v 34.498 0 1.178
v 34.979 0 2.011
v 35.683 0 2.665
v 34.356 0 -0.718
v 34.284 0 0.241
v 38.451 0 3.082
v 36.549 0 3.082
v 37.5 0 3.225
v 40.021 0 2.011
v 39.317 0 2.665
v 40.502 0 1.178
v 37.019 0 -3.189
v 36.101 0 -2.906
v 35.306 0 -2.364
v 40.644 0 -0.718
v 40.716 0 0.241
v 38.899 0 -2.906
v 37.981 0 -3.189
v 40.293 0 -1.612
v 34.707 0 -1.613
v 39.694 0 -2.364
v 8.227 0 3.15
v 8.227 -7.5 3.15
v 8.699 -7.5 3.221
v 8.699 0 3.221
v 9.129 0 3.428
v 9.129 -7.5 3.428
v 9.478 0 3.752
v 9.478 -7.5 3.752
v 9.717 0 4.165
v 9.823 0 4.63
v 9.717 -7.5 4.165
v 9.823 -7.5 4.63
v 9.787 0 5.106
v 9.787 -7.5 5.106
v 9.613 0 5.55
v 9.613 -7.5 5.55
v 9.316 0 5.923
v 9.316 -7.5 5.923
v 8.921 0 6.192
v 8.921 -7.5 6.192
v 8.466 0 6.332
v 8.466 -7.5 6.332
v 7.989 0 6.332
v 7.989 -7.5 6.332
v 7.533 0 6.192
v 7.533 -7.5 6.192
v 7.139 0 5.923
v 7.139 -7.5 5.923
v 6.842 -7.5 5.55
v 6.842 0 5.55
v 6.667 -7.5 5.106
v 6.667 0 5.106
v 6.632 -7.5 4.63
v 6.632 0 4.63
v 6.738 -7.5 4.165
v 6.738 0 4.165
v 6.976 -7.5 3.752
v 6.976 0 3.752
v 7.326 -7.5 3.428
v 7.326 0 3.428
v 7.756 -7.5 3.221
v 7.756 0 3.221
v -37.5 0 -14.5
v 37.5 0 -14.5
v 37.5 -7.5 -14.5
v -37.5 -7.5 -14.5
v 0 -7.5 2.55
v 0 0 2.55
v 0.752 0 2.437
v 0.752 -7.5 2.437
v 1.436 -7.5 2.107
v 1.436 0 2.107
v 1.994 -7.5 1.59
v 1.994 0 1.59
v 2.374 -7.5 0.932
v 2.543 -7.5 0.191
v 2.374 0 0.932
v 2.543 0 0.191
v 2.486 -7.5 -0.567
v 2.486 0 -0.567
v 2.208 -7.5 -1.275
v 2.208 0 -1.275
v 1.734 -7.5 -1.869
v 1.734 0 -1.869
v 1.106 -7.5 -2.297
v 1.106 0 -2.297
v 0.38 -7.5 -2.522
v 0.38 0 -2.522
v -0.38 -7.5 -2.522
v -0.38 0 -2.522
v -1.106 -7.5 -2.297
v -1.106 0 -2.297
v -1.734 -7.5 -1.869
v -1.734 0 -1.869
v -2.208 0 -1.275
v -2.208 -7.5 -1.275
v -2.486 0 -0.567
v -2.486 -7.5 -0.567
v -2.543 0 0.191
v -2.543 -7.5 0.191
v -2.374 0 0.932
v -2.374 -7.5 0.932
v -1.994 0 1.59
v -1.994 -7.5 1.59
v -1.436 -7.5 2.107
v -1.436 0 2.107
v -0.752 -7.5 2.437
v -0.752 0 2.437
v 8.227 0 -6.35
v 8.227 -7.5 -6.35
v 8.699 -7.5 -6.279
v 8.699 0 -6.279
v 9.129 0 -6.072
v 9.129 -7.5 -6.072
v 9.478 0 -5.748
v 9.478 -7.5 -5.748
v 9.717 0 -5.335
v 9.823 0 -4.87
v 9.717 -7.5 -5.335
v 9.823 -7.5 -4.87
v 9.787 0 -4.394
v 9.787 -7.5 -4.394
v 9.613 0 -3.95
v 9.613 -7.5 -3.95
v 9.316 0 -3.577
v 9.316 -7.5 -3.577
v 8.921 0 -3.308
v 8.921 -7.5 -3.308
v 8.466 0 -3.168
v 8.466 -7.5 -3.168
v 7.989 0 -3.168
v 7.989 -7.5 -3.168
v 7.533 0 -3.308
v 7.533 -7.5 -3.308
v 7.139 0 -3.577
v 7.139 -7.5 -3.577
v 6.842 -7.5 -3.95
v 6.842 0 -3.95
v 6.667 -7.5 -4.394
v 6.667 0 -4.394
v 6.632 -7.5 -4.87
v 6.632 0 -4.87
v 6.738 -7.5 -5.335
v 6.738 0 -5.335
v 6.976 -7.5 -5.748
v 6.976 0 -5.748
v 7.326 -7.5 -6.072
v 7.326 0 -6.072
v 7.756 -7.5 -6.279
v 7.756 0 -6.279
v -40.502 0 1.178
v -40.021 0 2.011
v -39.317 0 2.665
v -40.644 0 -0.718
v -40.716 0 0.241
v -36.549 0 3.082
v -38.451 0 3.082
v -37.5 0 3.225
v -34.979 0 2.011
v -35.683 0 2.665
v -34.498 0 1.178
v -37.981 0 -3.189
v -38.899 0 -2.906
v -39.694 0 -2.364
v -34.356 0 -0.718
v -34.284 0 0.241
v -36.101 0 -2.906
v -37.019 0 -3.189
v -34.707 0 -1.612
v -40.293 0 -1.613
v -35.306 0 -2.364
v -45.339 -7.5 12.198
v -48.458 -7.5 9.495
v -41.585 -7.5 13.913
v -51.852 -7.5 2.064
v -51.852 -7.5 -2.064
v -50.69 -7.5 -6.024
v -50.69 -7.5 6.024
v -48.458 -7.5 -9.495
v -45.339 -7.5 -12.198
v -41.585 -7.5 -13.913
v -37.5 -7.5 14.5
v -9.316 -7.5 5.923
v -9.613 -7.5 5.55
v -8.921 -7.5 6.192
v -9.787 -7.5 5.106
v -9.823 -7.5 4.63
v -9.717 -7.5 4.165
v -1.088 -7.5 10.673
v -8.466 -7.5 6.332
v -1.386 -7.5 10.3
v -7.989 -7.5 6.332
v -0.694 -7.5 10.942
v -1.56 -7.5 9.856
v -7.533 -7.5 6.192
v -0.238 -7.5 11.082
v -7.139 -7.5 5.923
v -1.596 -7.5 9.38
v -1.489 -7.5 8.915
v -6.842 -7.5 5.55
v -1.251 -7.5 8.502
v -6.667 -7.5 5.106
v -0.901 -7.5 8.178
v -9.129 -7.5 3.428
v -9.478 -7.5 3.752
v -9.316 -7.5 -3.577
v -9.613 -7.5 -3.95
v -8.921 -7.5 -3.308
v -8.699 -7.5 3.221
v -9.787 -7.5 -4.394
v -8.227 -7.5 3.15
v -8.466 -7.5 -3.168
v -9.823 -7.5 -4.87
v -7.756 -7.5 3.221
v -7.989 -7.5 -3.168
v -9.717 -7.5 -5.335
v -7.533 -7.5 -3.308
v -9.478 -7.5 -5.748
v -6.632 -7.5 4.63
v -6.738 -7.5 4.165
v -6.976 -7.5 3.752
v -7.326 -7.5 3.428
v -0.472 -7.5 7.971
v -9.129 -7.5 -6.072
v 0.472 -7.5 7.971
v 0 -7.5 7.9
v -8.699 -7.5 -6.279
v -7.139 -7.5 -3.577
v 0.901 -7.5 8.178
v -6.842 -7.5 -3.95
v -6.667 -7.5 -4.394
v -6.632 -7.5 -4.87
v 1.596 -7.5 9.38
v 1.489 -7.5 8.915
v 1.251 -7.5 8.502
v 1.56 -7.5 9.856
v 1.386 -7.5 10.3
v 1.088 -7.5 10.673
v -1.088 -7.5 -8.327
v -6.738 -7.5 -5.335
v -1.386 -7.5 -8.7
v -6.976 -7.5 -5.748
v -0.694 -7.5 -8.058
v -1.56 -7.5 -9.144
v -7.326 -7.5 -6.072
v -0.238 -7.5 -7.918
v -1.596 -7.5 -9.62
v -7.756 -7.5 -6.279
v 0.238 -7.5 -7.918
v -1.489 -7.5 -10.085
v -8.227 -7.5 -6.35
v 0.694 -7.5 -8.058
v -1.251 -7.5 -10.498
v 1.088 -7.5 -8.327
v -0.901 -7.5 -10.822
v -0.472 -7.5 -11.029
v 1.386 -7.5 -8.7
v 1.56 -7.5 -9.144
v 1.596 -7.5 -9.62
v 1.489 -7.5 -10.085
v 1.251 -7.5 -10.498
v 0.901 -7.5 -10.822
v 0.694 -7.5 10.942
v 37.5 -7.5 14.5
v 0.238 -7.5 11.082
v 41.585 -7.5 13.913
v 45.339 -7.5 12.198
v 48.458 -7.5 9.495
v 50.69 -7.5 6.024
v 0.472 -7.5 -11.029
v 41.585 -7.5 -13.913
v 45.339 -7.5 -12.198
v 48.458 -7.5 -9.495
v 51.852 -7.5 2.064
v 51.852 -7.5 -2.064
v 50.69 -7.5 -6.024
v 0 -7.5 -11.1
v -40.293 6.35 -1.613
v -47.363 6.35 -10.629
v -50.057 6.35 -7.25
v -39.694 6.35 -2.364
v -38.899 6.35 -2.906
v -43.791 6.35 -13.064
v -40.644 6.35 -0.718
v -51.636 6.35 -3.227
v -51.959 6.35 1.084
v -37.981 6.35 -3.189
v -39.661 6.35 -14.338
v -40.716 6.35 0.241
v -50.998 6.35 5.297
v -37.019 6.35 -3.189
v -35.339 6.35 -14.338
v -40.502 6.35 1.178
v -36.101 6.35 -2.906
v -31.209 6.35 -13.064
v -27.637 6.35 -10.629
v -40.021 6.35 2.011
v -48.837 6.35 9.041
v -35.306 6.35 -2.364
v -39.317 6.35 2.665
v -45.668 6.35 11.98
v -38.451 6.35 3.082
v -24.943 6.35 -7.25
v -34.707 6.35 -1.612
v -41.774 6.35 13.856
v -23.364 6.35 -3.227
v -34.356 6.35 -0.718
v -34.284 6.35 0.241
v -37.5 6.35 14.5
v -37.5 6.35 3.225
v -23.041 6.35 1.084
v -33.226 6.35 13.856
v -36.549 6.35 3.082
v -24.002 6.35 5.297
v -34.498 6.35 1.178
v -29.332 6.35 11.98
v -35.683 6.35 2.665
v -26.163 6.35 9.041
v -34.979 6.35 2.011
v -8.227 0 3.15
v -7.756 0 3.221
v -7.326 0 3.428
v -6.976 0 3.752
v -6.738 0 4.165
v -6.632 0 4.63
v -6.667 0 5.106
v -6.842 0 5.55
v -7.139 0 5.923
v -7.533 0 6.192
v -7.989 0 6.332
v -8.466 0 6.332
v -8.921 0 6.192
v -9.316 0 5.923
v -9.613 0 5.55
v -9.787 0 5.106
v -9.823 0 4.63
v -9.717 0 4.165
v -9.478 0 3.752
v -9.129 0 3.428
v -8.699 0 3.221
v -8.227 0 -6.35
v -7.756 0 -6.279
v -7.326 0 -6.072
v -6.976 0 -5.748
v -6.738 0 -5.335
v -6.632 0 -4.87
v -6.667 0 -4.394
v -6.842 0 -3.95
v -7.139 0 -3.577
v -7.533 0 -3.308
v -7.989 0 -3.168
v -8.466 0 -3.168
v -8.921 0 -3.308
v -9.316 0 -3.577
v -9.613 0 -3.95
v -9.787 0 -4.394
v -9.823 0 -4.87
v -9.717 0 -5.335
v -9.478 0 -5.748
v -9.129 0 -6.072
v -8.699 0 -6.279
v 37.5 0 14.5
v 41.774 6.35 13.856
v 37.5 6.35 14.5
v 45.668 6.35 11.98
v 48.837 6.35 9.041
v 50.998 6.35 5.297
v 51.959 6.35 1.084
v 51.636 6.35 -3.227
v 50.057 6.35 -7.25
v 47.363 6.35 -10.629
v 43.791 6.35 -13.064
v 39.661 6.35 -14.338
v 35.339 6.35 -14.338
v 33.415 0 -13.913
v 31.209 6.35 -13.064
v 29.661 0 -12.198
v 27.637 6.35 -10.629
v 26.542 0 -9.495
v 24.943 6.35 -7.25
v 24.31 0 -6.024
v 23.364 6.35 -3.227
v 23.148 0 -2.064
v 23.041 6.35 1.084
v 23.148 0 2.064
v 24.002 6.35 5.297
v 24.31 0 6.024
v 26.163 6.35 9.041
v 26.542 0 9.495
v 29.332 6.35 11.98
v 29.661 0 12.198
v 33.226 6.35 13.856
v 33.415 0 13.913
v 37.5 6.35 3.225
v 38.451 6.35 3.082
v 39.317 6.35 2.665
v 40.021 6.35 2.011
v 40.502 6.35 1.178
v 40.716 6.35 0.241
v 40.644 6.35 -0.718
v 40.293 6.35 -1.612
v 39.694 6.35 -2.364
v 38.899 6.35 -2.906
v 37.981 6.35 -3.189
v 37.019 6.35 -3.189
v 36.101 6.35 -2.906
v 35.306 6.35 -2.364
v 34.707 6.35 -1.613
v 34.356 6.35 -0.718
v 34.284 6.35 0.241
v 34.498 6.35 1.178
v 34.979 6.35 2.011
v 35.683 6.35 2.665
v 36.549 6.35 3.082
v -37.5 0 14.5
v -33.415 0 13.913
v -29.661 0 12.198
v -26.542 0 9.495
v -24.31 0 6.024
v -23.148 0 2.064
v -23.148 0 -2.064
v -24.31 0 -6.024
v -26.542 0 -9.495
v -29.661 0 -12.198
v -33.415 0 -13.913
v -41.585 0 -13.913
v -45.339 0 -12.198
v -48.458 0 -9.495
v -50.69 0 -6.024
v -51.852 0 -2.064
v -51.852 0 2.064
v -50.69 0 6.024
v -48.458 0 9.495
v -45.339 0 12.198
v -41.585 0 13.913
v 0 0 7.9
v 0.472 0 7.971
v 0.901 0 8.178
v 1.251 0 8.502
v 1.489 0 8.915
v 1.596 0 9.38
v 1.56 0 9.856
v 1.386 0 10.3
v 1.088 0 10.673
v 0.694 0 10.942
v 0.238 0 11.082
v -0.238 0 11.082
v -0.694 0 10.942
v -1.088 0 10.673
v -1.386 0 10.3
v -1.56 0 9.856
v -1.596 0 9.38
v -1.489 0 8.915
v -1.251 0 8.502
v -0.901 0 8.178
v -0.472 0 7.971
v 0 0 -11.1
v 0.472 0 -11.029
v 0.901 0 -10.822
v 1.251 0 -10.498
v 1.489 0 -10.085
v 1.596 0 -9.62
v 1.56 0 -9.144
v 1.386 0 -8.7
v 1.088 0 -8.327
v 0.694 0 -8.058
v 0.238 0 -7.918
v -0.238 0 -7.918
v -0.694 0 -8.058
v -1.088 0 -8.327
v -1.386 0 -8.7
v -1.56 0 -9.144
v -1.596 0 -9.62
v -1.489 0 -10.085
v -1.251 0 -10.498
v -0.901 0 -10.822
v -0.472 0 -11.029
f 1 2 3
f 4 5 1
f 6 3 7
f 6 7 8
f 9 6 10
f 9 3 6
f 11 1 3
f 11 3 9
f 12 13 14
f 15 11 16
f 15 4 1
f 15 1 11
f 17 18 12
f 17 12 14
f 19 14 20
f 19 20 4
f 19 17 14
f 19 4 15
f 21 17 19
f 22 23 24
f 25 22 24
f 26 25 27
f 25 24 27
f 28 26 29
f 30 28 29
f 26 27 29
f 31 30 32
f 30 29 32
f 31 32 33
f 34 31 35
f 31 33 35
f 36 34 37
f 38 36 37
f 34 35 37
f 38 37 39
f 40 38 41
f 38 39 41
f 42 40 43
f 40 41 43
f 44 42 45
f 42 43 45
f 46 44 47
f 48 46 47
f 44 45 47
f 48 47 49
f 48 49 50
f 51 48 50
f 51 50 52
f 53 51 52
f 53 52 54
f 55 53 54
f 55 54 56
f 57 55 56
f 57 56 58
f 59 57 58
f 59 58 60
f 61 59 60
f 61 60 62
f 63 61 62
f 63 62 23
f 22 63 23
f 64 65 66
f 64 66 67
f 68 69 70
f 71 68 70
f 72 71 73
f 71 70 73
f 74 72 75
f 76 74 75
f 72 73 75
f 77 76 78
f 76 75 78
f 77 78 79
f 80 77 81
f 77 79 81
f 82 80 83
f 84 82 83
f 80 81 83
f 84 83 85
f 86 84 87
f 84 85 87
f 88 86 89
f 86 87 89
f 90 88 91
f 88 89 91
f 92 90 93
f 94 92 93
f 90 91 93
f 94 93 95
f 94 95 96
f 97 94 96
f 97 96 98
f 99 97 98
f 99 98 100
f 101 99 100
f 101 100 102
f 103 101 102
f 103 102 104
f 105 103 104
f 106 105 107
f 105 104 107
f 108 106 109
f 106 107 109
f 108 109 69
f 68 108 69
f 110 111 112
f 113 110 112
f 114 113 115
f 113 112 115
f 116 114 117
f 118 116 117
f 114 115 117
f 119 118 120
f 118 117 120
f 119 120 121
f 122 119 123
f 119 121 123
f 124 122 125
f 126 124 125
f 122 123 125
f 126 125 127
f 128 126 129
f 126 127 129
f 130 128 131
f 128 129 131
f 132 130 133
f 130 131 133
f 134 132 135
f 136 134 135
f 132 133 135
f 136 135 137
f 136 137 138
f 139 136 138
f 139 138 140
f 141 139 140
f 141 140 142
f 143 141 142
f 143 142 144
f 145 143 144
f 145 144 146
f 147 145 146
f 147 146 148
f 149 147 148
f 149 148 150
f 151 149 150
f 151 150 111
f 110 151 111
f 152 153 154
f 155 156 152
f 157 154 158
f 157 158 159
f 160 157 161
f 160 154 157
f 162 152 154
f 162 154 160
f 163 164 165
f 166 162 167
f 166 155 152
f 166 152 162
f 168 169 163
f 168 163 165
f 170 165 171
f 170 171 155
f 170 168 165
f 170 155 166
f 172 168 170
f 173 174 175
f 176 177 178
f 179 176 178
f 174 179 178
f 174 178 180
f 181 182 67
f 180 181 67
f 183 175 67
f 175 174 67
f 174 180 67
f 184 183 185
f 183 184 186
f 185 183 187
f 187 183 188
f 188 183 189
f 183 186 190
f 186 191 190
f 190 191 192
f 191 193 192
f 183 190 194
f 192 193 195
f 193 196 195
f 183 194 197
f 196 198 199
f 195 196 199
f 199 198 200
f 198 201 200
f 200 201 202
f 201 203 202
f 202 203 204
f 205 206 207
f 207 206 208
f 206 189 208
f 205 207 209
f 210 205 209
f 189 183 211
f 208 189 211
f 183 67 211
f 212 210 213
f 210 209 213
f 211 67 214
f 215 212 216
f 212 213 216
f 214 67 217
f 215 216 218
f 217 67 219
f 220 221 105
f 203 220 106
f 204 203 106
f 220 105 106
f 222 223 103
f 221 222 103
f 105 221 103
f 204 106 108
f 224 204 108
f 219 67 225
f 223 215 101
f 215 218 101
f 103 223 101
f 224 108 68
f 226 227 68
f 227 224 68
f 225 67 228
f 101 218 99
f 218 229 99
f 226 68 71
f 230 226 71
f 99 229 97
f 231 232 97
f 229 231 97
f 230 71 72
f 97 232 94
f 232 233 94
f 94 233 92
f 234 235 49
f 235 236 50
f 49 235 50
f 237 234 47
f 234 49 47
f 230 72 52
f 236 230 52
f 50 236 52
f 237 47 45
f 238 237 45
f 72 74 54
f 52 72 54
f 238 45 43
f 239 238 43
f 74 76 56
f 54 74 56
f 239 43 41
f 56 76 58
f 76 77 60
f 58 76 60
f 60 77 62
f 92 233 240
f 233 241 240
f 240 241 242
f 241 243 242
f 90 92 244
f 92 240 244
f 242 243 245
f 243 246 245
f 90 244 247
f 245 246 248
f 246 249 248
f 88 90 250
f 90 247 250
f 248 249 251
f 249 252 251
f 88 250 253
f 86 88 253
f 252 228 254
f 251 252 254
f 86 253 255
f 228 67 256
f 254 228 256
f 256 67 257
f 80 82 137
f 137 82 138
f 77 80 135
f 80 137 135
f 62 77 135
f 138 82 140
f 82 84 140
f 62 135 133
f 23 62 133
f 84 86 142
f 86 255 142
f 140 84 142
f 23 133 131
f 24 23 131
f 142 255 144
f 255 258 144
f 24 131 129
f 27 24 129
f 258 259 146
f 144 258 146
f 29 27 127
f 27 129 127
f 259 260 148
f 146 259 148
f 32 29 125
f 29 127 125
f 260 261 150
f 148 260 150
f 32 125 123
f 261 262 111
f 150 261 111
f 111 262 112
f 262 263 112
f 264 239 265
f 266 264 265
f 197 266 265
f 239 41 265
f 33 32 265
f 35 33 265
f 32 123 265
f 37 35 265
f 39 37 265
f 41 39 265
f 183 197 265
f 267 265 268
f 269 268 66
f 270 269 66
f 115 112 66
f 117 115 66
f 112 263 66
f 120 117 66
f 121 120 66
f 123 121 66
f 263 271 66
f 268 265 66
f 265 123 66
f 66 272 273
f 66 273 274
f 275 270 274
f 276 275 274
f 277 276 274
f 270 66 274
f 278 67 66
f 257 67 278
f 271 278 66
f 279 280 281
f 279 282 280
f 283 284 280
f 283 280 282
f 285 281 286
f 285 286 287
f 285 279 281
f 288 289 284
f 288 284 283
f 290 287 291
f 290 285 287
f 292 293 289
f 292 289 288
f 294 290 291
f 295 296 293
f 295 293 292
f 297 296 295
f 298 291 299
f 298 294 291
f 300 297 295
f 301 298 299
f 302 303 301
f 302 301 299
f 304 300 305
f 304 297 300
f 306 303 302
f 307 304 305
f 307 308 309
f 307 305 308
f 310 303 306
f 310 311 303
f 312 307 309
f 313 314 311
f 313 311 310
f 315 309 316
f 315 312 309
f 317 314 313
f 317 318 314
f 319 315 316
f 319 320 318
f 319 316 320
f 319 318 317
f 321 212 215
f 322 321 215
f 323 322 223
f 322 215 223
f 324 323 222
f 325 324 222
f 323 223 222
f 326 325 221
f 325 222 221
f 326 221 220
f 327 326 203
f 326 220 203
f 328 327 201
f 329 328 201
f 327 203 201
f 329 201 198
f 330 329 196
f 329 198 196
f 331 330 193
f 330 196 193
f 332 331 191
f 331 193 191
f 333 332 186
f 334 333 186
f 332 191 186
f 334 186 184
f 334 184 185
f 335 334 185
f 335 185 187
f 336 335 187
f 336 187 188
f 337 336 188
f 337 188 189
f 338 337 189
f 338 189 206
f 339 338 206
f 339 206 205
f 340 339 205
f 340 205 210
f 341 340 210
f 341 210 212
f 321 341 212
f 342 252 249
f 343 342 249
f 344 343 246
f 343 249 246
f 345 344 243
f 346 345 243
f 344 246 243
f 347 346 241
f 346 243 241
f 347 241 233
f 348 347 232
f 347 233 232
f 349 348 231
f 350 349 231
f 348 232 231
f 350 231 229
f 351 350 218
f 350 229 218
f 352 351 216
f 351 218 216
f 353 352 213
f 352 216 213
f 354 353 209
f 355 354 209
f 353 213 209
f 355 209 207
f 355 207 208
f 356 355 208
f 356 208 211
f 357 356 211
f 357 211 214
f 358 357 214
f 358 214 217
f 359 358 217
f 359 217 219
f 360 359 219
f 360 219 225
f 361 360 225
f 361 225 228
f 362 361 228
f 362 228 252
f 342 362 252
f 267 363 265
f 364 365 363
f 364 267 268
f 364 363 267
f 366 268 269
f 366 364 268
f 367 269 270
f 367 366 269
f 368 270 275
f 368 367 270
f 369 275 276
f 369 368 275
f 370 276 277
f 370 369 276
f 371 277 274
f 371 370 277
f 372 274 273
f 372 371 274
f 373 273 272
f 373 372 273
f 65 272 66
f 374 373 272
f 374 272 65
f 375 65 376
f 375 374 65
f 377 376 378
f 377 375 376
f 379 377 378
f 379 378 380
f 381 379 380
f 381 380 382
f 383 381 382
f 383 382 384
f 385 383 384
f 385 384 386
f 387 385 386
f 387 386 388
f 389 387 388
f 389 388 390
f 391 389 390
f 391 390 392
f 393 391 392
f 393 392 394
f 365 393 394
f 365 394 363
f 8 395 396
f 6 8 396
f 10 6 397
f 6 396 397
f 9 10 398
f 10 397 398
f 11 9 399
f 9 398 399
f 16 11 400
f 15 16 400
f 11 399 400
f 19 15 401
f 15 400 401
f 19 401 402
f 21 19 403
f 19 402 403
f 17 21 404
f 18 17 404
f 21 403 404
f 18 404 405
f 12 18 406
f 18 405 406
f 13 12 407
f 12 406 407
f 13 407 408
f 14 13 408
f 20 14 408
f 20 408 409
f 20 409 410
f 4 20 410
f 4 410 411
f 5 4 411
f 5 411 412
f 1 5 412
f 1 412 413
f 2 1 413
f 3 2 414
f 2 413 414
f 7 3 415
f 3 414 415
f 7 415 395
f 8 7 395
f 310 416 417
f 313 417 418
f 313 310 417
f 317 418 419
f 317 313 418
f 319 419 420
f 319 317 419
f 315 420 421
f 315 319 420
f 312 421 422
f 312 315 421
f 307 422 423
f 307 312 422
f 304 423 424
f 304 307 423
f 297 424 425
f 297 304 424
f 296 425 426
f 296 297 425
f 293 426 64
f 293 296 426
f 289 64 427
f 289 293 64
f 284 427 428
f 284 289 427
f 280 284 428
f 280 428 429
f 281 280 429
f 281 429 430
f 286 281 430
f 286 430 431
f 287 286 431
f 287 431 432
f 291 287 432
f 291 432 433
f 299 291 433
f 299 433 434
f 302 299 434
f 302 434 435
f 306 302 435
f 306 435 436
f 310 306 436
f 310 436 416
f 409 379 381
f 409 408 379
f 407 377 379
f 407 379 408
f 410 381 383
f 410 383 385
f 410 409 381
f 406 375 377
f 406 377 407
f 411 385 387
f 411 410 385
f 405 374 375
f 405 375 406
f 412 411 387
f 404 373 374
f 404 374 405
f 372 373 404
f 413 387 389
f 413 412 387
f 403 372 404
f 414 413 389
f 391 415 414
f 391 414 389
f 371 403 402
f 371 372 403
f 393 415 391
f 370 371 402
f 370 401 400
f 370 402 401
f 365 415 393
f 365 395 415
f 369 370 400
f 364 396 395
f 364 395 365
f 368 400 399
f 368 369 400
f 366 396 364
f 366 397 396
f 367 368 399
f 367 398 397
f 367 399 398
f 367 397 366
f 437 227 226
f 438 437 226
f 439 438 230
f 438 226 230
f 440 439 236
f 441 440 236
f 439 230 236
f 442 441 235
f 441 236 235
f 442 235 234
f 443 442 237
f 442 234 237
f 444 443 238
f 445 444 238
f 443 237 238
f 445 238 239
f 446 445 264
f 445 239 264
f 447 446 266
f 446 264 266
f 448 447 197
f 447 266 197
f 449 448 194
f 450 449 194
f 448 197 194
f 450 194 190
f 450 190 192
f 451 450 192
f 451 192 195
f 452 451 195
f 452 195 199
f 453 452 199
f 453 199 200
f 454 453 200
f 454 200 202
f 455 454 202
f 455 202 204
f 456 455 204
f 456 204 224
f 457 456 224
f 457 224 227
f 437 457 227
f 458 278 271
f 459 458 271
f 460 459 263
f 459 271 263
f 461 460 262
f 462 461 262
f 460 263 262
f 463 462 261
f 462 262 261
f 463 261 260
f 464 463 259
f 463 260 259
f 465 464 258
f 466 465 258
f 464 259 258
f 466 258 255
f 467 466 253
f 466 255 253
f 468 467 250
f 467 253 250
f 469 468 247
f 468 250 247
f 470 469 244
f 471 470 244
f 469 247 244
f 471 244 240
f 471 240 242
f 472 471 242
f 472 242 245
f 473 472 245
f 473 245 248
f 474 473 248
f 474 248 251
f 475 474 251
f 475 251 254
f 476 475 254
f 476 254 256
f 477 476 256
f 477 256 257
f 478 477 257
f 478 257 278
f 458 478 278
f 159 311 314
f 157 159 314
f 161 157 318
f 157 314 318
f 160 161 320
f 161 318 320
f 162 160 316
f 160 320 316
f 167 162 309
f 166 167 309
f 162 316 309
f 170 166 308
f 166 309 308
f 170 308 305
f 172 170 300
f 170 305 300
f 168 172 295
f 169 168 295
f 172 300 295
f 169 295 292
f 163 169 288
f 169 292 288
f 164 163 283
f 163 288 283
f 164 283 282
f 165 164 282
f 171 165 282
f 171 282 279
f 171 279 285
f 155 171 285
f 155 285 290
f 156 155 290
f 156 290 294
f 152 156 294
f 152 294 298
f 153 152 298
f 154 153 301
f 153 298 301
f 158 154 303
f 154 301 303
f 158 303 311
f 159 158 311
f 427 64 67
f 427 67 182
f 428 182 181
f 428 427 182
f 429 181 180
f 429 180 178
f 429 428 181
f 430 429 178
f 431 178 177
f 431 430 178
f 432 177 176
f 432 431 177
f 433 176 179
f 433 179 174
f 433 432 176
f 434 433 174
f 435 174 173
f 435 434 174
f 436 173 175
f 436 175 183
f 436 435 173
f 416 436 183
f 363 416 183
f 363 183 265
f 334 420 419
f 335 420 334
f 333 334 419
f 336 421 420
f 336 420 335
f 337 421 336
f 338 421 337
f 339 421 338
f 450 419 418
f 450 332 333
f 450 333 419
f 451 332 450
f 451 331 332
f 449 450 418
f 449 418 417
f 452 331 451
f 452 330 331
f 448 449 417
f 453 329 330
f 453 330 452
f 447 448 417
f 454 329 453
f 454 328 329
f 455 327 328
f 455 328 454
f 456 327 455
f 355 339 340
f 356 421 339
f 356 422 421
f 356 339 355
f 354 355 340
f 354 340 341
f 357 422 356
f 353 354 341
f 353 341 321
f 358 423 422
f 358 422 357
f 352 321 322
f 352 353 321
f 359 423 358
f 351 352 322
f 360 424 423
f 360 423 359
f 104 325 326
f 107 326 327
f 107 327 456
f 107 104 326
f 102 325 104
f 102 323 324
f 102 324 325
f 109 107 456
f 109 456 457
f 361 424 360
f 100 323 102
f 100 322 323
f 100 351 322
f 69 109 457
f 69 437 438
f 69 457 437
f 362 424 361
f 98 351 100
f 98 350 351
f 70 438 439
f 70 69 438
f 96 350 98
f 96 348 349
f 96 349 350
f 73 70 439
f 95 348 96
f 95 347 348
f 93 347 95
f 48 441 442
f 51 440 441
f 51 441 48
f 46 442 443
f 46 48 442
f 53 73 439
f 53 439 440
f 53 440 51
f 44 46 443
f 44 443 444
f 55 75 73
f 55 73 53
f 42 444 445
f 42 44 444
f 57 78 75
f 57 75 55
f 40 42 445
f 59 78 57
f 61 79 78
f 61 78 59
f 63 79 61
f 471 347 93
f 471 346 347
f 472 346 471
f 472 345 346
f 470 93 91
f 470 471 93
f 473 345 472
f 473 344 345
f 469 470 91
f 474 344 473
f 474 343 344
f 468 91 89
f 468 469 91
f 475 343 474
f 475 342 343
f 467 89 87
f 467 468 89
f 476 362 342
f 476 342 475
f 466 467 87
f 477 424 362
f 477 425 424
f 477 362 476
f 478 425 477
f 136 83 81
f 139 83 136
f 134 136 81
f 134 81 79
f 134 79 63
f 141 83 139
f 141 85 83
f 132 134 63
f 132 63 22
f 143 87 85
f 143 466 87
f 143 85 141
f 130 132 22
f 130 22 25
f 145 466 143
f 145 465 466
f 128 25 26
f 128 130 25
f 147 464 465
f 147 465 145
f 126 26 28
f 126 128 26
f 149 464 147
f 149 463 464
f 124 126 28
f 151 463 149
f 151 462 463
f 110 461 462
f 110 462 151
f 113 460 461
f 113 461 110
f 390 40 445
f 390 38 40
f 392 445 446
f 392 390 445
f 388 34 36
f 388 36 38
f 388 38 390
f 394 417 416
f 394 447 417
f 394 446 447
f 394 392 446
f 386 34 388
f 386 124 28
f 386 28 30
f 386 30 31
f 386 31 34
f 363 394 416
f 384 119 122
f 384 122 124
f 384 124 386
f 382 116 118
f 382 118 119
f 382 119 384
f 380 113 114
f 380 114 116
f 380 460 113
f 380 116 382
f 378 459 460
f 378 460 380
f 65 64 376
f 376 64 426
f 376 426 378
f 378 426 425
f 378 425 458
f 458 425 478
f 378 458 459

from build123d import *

# Parameters (mm, degrees)
SKETCH1_R            = 2.55
BOSS_EXTRUDE1_DEPTH  = 7.5
BOSS_EXTRUDE2_START  = 6.35
SKETCH1_3_R          = 14.5
SKETCH1_3_R_2        = 3.225
BOSS_EXTRUDE2_DEPTH  = 6.35
M3_CLEARANCE_HOLE1_D = 3.2


with BuildPart() as part:
    # Sketch1 → Boss-Extrude1 (new body)
    with BuildSketch(Plane(origin=(0, 0, 0), x_dir=(1, 0, 0), z_dir=(0, 1, 0))):
        with BuildLine():
            Line((37.5, 14.5), (-37.5, 14.5))
            ThreePointArc((-37.5, 14.5), (-52, 0), (-37.5, -14.5))
            Line((-37.5, -14.5), (37.5, -14.5))
            ThreePointArc((37.5, -14.5), (52, 0), (37.5, 14.5))
        make_face()
        Circle(SKETCH1_R, mode=Mode.SUBTRACT)
    extrude(amount=-BOSS_EXTRUDE1_DEPTH)

    # Sketch1<3> → Boss-Extrude2 (add)
    # profile 1 of 2: a face of its own
    with BuildSketch(Plane(origin=(0, 0, 0), x_dir=(1, 0, 0), z_dir=(0, 1, 0)).offset(BOSS_EXTRUDE2_START)):
        with Locations((-37.5, 0)):
            Circle(SKETCH1_3_R)
        with Locations((-37.5, 0)):
            Circle(SKETCH1_3_R_2, mode=Mode.SUBTRACT)
    # profile 2 of 2: a face of its own
    with BuildSketch(Plane(origin=(0, 0, 0), x_dir=(1, 0, 0), z_dir=(0, 1, 0)).offset(BOSS_EXTRUDE2_START)):
        with Locations((37.5, 0)):
            Circle(SKETCH1_3_R)
        with Locations((37.5, 0)):
            Circle(SKETCH1_3_R_2, mode=Mode.SUBTRACT)
    extrude(amount=-BOSS_EXTRUDE2_DEPTH)

    # M3 Clearance Hole1 (through all)
    with Locations(Plane(origin=(-8.227241336, 0, -4.75), x_dir=(0, 0, 1), z_dir=(0, 1, 0))):
        with Locations((0, 0), (-4.75, 8.227241336), (0, 16.454482672), (9.5, 0), (9.5, 16.454482672), (14.25, 8.227241336)):
            Hole(M3_CLEARANCE_HOLE1_D / 2)


solid = part.part
